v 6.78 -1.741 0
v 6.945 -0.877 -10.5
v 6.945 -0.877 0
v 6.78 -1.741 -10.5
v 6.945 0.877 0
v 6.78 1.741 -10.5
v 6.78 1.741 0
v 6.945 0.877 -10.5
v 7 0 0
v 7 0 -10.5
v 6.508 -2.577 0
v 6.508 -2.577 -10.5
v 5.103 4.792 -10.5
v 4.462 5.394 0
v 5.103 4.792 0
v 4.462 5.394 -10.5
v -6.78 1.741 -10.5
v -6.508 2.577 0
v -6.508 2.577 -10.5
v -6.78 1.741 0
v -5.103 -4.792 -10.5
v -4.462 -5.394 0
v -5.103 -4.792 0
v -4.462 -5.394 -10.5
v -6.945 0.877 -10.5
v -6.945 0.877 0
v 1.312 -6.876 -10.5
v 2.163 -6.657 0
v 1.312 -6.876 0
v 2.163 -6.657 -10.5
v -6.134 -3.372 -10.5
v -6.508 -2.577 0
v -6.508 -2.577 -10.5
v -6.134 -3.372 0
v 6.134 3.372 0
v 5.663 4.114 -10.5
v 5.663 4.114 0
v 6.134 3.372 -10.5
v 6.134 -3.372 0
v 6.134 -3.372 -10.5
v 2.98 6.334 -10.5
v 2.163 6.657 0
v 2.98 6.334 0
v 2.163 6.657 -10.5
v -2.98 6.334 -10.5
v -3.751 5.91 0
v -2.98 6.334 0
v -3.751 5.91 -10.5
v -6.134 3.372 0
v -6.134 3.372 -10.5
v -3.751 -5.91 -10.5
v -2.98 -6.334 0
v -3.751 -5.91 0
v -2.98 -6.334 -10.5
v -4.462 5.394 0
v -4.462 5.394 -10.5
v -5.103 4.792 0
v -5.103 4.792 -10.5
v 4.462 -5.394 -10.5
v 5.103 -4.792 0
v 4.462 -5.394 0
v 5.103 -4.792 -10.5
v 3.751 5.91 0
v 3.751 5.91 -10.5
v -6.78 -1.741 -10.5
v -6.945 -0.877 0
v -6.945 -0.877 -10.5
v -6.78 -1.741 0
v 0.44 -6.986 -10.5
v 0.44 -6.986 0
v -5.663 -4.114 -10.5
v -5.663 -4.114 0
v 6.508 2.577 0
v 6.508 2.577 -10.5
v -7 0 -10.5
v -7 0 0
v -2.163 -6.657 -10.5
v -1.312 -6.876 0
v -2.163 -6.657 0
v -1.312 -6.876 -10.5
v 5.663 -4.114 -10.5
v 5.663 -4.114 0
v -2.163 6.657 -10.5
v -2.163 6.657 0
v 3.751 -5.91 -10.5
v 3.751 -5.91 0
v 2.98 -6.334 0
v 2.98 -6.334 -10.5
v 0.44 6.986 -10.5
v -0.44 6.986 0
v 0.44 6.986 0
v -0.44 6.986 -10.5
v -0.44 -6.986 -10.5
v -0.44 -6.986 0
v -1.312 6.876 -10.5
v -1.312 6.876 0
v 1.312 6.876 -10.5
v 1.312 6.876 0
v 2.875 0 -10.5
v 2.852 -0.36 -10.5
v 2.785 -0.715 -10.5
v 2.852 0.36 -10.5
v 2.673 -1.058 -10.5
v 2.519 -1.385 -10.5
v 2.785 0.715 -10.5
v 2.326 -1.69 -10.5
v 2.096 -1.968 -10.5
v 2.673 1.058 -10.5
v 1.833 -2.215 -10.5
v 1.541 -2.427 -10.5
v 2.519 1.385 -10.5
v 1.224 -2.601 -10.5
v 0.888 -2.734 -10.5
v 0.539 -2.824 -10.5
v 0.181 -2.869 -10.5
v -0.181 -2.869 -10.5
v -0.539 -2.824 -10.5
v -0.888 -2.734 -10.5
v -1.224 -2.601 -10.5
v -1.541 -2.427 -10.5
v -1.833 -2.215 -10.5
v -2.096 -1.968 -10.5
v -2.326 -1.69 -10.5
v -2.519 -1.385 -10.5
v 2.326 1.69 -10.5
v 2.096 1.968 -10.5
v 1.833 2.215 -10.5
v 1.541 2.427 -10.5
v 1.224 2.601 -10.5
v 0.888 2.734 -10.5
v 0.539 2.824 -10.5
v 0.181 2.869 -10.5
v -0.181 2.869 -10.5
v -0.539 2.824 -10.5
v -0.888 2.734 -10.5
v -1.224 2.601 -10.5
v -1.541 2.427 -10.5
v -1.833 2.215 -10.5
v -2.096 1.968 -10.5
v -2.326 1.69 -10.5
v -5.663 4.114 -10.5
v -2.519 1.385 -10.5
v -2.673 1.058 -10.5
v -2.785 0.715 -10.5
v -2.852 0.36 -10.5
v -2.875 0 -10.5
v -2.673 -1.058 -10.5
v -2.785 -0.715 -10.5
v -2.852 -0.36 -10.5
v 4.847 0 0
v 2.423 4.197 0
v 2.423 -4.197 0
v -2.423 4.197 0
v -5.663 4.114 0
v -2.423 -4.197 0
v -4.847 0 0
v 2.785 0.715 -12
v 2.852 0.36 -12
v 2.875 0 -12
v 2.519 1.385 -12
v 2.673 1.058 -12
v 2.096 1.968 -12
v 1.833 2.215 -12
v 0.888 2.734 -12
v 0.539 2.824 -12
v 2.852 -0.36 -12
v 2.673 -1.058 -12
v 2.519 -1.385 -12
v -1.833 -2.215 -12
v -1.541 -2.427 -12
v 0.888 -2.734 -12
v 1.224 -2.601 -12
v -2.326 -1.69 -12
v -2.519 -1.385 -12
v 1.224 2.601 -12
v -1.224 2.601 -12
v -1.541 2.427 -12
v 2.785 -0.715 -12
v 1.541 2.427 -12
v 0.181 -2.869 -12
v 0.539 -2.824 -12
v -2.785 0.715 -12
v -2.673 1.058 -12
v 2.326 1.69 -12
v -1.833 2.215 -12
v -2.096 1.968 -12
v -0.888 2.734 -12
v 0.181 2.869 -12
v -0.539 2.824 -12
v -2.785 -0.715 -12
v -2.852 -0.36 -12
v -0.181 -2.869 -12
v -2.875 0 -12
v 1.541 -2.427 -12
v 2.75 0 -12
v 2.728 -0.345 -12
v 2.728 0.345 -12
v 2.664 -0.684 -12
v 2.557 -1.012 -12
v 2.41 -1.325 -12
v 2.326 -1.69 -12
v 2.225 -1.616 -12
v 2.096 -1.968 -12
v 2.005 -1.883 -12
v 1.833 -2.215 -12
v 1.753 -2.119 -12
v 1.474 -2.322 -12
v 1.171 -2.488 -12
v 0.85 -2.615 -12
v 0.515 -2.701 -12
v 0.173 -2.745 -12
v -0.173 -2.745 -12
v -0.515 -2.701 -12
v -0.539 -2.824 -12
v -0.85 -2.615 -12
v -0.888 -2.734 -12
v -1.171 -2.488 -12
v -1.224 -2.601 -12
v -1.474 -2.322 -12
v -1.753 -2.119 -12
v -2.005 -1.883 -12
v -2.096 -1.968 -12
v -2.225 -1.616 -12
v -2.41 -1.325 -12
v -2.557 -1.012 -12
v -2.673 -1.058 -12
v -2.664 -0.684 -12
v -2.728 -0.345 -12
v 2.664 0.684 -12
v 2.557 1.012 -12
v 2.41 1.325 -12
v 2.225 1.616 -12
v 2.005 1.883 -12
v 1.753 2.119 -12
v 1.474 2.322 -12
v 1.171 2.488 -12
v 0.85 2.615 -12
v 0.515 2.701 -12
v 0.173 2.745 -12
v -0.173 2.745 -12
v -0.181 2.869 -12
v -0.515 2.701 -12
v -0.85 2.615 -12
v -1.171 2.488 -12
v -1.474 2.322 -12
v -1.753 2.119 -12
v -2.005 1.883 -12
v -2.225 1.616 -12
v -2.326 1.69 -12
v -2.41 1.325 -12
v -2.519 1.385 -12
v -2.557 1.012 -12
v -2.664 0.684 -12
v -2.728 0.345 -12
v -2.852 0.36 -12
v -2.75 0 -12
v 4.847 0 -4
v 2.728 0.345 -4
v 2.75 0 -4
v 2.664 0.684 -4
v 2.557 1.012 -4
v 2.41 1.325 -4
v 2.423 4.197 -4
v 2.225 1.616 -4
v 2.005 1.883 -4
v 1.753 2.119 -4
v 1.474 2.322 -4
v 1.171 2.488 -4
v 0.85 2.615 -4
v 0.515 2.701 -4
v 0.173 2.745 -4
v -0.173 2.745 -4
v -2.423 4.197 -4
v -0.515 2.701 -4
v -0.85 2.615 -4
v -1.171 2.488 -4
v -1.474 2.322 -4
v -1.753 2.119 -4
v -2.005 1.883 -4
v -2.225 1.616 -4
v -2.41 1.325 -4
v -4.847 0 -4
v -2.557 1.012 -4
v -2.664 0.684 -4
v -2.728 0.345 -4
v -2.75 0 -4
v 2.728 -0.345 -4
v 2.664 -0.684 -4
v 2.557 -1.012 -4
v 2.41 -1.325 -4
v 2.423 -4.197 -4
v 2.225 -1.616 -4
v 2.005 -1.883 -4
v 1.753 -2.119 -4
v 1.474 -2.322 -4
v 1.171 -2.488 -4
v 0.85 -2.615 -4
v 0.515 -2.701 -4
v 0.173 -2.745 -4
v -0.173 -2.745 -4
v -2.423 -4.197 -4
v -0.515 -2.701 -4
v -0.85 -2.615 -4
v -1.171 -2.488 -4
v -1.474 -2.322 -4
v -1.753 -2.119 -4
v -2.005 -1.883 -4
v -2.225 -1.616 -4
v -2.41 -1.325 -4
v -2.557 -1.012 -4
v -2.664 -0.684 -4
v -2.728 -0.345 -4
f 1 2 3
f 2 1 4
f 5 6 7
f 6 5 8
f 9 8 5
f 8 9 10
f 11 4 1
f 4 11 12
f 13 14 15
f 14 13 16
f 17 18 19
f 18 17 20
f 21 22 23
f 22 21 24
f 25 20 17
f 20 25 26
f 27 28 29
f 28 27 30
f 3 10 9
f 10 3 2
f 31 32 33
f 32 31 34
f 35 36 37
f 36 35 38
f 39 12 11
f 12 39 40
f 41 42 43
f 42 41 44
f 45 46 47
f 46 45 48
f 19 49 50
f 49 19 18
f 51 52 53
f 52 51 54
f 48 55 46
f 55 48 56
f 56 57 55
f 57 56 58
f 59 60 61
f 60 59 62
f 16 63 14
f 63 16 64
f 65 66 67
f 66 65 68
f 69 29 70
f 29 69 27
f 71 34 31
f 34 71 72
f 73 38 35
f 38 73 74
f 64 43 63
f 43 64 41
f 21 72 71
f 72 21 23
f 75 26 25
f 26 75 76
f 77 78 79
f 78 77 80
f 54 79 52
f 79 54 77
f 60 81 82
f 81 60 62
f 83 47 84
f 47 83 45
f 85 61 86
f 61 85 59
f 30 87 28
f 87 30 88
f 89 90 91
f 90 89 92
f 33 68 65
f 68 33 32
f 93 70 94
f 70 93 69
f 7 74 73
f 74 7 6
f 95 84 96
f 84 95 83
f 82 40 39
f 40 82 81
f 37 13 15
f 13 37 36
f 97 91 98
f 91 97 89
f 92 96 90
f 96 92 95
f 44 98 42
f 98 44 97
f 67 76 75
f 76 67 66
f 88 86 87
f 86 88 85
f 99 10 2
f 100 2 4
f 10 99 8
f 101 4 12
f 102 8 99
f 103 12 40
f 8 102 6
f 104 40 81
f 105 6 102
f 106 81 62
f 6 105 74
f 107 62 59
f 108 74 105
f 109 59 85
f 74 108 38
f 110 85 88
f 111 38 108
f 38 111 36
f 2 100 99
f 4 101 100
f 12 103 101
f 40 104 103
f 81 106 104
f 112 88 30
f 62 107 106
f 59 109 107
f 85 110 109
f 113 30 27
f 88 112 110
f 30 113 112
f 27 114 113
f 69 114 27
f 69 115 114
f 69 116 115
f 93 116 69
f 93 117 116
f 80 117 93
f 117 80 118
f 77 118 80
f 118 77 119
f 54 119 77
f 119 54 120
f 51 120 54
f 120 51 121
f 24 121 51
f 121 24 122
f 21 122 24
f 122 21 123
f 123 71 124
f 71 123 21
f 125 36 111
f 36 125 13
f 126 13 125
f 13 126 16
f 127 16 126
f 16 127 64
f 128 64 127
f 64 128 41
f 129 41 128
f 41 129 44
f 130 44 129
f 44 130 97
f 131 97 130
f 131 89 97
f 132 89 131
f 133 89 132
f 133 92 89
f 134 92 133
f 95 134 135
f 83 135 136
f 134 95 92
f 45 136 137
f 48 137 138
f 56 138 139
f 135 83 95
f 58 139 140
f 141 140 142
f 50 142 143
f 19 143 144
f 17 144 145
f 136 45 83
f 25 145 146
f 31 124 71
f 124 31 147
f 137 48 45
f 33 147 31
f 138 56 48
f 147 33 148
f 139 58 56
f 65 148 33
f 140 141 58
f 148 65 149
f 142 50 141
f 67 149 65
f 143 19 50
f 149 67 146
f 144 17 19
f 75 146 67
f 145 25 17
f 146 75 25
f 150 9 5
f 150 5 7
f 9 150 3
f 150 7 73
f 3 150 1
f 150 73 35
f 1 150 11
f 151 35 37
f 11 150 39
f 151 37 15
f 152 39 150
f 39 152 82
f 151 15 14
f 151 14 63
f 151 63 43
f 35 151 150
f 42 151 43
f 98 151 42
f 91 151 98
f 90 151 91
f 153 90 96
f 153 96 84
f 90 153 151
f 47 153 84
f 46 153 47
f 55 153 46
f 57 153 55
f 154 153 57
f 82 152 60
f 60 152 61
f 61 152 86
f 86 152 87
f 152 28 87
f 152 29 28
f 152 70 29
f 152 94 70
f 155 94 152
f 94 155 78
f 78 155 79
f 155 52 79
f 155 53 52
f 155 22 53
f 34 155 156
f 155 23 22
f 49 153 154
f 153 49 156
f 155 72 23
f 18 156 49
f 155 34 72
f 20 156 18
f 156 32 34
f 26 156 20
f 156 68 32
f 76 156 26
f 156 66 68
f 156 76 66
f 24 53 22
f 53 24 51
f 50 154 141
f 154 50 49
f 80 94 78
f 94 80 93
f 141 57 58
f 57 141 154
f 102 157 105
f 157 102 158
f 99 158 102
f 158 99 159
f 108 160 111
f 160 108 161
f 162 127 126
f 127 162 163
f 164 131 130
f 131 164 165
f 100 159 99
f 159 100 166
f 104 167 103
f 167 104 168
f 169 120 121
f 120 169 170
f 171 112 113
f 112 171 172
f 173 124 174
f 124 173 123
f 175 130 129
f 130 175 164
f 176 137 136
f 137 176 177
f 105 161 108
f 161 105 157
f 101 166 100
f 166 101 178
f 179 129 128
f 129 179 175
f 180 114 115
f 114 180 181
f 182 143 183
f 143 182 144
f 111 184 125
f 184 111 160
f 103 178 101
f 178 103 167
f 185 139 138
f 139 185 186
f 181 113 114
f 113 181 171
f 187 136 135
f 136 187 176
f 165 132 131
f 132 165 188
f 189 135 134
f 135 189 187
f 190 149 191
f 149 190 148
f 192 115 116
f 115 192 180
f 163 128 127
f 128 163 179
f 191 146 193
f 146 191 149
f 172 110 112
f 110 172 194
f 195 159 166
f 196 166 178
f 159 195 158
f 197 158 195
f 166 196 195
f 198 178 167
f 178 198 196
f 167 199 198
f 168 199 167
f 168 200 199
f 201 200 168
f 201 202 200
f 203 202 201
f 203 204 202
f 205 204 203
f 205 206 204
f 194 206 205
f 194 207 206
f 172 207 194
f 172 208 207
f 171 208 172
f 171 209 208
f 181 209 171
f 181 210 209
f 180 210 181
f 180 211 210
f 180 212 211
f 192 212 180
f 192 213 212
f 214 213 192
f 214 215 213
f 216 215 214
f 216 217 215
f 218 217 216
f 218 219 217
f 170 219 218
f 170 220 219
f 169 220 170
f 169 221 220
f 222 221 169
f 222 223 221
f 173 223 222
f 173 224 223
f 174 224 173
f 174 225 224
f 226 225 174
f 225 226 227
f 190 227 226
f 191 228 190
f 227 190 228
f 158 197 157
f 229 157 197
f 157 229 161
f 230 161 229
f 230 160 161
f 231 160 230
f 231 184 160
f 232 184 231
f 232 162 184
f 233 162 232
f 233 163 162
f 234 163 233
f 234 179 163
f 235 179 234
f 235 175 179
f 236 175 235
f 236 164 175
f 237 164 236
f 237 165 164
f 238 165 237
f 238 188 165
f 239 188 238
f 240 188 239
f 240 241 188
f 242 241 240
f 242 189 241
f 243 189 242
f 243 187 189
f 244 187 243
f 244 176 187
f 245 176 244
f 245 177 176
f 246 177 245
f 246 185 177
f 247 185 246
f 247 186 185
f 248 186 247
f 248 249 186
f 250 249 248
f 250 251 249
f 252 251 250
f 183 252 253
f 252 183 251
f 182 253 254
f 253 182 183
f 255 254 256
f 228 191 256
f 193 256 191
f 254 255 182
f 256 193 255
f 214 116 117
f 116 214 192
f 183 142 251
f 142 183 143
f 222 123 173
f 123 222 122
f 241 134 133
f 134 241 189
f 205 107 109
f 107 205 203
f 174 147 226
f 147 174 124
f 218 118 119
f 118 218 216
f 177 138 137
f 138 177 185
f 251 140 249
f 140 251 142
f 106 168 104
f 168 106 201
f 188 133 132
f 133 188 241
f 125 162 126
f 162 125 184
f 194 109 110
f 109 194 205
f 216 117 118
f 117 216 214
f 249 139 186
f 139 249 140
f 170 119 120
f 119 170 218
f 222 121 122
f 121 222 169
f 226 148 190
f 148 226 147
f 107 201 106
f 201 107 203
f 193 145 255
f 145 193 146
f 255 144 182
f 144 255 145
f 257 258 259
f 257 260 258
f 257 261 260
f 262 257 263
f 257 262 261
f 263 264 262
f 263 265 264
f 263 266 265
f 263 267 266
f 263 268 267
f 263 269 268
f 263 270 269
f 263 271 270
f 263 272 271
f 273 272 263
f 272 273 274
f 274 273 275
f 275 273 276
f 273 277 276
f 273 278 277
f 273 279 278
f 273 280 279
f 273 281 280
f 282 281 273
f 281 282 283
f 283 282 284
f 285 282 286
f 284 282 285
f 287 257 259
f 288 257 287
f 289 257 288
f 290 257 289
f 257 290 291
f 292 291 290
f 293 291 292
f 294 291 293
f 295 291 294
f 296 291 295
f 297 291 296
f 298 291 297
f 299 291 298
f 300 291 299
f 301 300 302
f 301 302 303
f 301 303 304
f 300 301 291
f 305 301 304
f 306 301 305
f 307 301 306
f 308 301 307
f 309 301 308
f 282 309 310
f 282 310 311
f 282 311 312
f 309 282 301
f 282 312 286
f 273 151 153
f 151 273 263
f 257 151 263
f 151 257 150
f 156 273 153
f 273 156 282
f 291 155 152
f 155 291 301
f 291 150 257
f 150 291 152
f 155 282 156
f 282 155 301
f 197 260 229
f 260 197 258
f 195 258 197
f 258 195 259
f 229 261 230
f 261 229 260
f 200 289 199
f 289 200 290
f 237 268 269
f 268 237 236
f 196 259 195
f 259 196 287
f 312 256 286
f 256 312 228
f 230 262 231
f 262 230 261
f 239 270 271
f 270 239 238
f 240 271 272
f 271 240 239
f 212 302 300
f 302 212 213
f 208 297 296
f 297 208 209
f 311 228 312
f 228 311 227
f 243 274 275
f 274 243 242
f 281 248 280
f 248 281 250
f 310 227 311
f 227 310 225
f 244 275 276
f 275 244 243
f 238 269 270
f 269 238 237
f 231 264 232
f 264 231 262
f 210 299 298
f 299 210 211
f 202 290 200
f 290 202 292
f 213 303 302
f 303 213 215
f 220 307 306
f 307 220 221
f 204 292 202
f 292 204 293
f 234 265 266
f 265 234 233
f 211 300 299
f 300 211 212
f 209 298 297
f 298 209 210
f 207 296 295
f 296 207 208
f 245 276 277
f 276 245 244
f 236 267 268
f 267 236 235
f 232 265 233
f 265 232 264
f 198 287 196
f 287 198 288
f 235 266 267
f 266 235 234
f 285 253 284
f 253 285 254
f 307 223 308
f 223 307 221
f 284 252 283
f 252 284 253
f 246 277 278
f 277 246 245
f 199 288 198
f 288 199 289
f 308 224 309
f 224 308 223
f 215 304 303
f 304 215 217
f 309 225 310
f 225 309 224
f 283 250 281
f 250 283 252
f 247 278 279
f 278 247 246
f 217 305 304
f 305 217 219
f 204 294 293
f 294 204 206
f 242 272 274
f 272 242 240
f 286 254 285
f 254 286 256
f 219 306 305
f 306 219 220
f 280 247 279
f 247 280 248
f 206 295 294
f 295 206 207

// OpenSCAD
$fn = 50;

difference() {
	union() {
		translate(v = [0, 0, -10.5]) {
			cylinder(h = 10.5, r = 7.0);
		}
		#translate(v = [0, 0, -12.0]) {
			cylinder(h = 12, r = 2.875);
		}
	}
	union() {
		translate(v = [0, 0, 0]) {
			rotate(a = [0, 0, 0]) {
				difference() {
					union() {
						translate(v = [0, 0, -4]) {
							linear_extrude(height = 4) {
								polygon(points = [[4.8468, 0.0], [2.4234000000000004, 4.197451927062417], [-2.423399999999999, 4.197451927062417], [-4.8468, 5.935618106107392e-16], [-2.423400000000002, -4.197451927062416], [2.423399999999997, -4.197451927062419]]);
							}
						}
					}
					union();
				}
			}
		}
		#translate(v = [0, 0, -100.0]) {
			cylinder(h = 200, r = 2.75);
		}
	}
}
